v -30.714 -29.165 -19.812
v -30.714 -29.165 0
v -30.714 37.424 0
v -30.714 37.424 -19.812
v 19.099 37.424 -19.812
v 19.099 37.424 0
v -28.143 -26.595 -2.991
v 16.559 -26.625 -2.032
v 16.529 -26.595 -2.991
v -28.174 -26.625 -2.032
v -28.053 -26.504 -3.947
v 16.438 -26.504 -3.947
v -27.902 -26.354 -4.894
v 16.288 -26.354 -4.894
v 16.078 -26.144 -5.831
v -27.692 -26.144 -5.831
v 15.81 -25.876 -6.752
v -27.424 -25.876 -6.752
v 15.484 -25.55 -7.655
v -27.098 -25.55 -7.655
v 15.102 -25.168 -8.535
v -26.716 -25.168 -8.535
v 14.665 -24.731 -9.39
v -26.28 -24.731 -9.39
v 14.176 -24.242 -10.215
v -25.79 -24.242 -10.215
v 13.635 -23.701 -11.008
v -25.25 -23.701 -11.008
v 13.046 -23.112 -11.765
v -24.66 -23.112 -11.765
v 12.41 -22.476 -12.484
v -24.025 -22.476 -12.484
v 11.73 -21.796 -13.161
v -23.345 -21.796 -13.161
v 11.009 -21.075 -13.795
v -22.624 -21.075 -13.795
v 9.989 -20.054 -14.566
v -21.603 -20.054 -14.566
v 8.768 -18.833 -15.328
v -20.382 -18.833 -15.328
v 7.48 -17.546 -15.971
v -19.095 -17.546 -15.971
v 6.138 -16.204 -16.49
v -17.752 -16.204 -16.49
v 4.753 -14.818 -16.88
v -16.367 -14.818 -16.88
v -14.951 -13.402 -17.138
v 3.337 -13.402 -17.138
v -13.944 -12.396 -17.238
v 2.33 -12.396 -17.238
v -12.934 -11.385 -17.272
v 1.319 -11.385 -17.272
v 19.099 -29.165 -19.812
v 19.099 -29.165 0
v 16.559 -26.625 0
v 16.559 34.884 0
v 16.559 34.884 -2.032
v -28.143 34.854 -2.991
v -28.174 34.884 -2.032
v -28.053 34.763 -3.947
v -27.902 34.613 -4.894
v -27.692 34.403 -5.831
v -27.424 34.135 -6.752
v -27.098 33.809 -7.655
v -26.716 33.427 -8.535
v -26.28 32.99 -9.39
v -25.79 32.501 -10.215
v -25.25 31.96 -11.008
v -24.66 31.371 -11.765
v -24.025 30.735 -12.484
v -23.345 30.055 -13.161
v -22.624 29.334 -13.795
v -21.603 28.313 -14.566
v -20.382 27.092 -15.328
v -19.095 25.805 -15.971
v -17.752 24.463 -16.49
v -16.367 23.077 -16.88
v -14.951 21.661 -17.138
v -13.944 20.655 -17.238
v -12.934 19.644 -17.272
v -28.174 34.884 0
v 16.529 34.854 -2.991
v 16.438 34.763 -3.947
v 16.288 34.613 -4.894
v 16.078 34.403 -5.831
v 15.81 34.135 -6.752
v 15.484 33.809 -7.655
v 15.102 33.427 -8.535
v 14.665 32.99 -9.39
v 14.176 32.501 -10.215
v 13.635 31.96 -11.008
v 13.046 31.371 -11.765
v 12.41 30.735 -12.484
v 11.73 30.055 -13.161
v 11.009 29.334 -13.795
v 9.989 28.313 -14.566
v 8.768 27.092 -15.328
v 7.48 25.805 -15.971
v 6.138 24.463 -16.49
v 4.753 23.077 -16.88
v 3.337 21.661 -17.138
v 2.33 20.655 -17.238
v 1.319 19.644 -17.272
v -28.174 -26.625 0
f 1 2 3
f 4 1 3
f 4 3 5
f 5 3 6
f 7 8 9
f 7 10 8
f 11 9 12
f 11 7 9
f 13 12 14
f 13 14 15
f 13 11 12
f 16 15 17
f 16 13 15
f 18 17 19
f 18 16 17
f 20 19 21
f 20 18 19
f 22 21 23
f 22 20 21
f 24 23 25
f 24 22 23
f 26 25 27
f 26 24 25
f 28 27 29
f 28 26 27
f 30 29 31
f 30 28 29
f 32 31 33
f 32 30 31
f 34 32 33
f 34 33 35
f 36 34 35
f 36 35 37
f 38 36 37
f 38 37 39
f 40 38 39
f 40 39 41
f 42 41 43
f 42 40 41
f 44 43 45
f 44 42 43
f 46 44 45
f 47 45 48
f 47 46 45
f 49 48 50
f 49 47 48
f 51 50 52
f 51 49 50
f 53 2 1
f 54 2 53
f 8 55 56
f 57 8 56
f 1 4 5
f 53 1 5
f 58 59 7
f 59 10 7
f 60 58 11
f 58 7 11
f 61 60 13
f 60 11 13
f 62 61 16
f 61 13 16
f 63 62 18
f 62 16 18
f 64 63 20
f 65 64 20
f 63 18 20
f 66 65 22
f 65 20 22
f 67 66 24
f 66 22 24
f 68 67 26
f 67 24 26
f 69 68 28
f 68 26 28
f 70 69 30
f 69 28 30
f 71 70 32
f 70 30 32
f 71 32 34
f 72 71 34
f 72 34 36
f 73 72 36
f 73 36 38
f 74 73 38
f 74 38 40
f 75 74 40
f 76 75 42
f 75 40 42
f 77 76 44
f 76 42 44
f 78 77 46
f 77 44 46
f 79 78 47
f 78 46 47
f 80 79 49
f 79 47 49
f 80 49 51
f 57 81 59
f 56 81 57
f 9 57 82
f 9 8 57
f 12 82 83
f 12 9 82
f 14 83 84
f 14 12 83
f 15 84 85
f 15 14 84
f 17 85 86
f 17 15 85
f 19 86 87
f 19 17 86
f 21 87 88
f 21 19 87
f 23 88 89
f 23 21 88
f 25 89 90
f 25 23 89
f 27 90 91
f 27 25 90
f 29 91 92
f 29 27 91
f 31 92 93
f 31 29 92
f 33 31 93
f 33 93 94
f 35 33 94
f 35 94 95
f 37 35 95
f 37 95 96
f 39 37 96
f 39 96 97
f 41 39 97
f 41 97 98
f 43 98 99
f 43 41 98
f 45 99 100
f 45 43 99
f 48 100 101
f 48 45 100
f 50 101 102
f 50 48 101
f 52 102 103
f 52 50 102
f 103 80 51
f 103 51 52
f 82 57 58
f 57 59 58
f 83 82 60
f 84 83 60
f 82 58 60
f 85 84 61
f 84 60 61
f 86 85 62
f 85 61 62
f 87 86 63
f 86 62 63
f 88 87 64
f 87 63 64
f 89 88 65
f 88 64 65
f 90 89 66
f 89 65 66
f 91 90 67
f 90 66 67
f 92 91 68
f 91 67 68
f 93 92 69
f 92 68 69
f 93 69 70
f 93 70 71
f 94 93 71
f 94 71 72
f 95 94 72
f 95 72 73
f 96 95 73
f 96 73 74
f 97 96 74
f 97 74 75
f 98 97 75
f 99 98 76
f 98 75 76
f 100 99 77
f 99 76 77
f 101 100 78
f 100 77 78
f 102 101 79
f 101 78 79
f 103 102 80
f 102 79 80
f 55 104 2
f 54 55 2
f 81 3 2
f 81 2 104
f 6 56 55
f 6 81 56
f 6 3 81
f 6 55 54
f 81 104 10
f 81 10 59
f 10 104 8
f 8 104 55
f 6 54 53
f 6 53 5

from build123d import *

# Parameters (mm, degrees)
F0_W     = 49.8126782477
F0_H     = 66.5889680386
F1_DEPTH = 19.812
F2_T     = -2.54
F3_R     = 15.24


with BuildPart() as f1:
    # F0 (on Top) → F1 (new body)
    with BuildSketch(Plane.XY):
        with Locations((-5.807178095, 4.1295476258)):
            Rectangle(F0_W, F0_H)
    extrude(amount=-F1_DEPTH)

    # F2
    f2_openings = [f1.faces().sort_by_distance(p)[0] for p in [
        (-5.807178, 4.129548, 0),
    ]]
    offset(amount=F2_T, openings=f2_openings)

    # F3
    f3_edges = [f1.edges().sort_by_distance(p)[0] for p in [
        (16.559161, 4.129548, -17.272),
        (-5.807178, -26.624936, -17.272),
        (-5.807178, 34.884032, -17.272),
        (-28.173517, 4.129548, -17.272),
    ]]
    fillet(f3_edges, radius=F3_R)


solid = f1.part
